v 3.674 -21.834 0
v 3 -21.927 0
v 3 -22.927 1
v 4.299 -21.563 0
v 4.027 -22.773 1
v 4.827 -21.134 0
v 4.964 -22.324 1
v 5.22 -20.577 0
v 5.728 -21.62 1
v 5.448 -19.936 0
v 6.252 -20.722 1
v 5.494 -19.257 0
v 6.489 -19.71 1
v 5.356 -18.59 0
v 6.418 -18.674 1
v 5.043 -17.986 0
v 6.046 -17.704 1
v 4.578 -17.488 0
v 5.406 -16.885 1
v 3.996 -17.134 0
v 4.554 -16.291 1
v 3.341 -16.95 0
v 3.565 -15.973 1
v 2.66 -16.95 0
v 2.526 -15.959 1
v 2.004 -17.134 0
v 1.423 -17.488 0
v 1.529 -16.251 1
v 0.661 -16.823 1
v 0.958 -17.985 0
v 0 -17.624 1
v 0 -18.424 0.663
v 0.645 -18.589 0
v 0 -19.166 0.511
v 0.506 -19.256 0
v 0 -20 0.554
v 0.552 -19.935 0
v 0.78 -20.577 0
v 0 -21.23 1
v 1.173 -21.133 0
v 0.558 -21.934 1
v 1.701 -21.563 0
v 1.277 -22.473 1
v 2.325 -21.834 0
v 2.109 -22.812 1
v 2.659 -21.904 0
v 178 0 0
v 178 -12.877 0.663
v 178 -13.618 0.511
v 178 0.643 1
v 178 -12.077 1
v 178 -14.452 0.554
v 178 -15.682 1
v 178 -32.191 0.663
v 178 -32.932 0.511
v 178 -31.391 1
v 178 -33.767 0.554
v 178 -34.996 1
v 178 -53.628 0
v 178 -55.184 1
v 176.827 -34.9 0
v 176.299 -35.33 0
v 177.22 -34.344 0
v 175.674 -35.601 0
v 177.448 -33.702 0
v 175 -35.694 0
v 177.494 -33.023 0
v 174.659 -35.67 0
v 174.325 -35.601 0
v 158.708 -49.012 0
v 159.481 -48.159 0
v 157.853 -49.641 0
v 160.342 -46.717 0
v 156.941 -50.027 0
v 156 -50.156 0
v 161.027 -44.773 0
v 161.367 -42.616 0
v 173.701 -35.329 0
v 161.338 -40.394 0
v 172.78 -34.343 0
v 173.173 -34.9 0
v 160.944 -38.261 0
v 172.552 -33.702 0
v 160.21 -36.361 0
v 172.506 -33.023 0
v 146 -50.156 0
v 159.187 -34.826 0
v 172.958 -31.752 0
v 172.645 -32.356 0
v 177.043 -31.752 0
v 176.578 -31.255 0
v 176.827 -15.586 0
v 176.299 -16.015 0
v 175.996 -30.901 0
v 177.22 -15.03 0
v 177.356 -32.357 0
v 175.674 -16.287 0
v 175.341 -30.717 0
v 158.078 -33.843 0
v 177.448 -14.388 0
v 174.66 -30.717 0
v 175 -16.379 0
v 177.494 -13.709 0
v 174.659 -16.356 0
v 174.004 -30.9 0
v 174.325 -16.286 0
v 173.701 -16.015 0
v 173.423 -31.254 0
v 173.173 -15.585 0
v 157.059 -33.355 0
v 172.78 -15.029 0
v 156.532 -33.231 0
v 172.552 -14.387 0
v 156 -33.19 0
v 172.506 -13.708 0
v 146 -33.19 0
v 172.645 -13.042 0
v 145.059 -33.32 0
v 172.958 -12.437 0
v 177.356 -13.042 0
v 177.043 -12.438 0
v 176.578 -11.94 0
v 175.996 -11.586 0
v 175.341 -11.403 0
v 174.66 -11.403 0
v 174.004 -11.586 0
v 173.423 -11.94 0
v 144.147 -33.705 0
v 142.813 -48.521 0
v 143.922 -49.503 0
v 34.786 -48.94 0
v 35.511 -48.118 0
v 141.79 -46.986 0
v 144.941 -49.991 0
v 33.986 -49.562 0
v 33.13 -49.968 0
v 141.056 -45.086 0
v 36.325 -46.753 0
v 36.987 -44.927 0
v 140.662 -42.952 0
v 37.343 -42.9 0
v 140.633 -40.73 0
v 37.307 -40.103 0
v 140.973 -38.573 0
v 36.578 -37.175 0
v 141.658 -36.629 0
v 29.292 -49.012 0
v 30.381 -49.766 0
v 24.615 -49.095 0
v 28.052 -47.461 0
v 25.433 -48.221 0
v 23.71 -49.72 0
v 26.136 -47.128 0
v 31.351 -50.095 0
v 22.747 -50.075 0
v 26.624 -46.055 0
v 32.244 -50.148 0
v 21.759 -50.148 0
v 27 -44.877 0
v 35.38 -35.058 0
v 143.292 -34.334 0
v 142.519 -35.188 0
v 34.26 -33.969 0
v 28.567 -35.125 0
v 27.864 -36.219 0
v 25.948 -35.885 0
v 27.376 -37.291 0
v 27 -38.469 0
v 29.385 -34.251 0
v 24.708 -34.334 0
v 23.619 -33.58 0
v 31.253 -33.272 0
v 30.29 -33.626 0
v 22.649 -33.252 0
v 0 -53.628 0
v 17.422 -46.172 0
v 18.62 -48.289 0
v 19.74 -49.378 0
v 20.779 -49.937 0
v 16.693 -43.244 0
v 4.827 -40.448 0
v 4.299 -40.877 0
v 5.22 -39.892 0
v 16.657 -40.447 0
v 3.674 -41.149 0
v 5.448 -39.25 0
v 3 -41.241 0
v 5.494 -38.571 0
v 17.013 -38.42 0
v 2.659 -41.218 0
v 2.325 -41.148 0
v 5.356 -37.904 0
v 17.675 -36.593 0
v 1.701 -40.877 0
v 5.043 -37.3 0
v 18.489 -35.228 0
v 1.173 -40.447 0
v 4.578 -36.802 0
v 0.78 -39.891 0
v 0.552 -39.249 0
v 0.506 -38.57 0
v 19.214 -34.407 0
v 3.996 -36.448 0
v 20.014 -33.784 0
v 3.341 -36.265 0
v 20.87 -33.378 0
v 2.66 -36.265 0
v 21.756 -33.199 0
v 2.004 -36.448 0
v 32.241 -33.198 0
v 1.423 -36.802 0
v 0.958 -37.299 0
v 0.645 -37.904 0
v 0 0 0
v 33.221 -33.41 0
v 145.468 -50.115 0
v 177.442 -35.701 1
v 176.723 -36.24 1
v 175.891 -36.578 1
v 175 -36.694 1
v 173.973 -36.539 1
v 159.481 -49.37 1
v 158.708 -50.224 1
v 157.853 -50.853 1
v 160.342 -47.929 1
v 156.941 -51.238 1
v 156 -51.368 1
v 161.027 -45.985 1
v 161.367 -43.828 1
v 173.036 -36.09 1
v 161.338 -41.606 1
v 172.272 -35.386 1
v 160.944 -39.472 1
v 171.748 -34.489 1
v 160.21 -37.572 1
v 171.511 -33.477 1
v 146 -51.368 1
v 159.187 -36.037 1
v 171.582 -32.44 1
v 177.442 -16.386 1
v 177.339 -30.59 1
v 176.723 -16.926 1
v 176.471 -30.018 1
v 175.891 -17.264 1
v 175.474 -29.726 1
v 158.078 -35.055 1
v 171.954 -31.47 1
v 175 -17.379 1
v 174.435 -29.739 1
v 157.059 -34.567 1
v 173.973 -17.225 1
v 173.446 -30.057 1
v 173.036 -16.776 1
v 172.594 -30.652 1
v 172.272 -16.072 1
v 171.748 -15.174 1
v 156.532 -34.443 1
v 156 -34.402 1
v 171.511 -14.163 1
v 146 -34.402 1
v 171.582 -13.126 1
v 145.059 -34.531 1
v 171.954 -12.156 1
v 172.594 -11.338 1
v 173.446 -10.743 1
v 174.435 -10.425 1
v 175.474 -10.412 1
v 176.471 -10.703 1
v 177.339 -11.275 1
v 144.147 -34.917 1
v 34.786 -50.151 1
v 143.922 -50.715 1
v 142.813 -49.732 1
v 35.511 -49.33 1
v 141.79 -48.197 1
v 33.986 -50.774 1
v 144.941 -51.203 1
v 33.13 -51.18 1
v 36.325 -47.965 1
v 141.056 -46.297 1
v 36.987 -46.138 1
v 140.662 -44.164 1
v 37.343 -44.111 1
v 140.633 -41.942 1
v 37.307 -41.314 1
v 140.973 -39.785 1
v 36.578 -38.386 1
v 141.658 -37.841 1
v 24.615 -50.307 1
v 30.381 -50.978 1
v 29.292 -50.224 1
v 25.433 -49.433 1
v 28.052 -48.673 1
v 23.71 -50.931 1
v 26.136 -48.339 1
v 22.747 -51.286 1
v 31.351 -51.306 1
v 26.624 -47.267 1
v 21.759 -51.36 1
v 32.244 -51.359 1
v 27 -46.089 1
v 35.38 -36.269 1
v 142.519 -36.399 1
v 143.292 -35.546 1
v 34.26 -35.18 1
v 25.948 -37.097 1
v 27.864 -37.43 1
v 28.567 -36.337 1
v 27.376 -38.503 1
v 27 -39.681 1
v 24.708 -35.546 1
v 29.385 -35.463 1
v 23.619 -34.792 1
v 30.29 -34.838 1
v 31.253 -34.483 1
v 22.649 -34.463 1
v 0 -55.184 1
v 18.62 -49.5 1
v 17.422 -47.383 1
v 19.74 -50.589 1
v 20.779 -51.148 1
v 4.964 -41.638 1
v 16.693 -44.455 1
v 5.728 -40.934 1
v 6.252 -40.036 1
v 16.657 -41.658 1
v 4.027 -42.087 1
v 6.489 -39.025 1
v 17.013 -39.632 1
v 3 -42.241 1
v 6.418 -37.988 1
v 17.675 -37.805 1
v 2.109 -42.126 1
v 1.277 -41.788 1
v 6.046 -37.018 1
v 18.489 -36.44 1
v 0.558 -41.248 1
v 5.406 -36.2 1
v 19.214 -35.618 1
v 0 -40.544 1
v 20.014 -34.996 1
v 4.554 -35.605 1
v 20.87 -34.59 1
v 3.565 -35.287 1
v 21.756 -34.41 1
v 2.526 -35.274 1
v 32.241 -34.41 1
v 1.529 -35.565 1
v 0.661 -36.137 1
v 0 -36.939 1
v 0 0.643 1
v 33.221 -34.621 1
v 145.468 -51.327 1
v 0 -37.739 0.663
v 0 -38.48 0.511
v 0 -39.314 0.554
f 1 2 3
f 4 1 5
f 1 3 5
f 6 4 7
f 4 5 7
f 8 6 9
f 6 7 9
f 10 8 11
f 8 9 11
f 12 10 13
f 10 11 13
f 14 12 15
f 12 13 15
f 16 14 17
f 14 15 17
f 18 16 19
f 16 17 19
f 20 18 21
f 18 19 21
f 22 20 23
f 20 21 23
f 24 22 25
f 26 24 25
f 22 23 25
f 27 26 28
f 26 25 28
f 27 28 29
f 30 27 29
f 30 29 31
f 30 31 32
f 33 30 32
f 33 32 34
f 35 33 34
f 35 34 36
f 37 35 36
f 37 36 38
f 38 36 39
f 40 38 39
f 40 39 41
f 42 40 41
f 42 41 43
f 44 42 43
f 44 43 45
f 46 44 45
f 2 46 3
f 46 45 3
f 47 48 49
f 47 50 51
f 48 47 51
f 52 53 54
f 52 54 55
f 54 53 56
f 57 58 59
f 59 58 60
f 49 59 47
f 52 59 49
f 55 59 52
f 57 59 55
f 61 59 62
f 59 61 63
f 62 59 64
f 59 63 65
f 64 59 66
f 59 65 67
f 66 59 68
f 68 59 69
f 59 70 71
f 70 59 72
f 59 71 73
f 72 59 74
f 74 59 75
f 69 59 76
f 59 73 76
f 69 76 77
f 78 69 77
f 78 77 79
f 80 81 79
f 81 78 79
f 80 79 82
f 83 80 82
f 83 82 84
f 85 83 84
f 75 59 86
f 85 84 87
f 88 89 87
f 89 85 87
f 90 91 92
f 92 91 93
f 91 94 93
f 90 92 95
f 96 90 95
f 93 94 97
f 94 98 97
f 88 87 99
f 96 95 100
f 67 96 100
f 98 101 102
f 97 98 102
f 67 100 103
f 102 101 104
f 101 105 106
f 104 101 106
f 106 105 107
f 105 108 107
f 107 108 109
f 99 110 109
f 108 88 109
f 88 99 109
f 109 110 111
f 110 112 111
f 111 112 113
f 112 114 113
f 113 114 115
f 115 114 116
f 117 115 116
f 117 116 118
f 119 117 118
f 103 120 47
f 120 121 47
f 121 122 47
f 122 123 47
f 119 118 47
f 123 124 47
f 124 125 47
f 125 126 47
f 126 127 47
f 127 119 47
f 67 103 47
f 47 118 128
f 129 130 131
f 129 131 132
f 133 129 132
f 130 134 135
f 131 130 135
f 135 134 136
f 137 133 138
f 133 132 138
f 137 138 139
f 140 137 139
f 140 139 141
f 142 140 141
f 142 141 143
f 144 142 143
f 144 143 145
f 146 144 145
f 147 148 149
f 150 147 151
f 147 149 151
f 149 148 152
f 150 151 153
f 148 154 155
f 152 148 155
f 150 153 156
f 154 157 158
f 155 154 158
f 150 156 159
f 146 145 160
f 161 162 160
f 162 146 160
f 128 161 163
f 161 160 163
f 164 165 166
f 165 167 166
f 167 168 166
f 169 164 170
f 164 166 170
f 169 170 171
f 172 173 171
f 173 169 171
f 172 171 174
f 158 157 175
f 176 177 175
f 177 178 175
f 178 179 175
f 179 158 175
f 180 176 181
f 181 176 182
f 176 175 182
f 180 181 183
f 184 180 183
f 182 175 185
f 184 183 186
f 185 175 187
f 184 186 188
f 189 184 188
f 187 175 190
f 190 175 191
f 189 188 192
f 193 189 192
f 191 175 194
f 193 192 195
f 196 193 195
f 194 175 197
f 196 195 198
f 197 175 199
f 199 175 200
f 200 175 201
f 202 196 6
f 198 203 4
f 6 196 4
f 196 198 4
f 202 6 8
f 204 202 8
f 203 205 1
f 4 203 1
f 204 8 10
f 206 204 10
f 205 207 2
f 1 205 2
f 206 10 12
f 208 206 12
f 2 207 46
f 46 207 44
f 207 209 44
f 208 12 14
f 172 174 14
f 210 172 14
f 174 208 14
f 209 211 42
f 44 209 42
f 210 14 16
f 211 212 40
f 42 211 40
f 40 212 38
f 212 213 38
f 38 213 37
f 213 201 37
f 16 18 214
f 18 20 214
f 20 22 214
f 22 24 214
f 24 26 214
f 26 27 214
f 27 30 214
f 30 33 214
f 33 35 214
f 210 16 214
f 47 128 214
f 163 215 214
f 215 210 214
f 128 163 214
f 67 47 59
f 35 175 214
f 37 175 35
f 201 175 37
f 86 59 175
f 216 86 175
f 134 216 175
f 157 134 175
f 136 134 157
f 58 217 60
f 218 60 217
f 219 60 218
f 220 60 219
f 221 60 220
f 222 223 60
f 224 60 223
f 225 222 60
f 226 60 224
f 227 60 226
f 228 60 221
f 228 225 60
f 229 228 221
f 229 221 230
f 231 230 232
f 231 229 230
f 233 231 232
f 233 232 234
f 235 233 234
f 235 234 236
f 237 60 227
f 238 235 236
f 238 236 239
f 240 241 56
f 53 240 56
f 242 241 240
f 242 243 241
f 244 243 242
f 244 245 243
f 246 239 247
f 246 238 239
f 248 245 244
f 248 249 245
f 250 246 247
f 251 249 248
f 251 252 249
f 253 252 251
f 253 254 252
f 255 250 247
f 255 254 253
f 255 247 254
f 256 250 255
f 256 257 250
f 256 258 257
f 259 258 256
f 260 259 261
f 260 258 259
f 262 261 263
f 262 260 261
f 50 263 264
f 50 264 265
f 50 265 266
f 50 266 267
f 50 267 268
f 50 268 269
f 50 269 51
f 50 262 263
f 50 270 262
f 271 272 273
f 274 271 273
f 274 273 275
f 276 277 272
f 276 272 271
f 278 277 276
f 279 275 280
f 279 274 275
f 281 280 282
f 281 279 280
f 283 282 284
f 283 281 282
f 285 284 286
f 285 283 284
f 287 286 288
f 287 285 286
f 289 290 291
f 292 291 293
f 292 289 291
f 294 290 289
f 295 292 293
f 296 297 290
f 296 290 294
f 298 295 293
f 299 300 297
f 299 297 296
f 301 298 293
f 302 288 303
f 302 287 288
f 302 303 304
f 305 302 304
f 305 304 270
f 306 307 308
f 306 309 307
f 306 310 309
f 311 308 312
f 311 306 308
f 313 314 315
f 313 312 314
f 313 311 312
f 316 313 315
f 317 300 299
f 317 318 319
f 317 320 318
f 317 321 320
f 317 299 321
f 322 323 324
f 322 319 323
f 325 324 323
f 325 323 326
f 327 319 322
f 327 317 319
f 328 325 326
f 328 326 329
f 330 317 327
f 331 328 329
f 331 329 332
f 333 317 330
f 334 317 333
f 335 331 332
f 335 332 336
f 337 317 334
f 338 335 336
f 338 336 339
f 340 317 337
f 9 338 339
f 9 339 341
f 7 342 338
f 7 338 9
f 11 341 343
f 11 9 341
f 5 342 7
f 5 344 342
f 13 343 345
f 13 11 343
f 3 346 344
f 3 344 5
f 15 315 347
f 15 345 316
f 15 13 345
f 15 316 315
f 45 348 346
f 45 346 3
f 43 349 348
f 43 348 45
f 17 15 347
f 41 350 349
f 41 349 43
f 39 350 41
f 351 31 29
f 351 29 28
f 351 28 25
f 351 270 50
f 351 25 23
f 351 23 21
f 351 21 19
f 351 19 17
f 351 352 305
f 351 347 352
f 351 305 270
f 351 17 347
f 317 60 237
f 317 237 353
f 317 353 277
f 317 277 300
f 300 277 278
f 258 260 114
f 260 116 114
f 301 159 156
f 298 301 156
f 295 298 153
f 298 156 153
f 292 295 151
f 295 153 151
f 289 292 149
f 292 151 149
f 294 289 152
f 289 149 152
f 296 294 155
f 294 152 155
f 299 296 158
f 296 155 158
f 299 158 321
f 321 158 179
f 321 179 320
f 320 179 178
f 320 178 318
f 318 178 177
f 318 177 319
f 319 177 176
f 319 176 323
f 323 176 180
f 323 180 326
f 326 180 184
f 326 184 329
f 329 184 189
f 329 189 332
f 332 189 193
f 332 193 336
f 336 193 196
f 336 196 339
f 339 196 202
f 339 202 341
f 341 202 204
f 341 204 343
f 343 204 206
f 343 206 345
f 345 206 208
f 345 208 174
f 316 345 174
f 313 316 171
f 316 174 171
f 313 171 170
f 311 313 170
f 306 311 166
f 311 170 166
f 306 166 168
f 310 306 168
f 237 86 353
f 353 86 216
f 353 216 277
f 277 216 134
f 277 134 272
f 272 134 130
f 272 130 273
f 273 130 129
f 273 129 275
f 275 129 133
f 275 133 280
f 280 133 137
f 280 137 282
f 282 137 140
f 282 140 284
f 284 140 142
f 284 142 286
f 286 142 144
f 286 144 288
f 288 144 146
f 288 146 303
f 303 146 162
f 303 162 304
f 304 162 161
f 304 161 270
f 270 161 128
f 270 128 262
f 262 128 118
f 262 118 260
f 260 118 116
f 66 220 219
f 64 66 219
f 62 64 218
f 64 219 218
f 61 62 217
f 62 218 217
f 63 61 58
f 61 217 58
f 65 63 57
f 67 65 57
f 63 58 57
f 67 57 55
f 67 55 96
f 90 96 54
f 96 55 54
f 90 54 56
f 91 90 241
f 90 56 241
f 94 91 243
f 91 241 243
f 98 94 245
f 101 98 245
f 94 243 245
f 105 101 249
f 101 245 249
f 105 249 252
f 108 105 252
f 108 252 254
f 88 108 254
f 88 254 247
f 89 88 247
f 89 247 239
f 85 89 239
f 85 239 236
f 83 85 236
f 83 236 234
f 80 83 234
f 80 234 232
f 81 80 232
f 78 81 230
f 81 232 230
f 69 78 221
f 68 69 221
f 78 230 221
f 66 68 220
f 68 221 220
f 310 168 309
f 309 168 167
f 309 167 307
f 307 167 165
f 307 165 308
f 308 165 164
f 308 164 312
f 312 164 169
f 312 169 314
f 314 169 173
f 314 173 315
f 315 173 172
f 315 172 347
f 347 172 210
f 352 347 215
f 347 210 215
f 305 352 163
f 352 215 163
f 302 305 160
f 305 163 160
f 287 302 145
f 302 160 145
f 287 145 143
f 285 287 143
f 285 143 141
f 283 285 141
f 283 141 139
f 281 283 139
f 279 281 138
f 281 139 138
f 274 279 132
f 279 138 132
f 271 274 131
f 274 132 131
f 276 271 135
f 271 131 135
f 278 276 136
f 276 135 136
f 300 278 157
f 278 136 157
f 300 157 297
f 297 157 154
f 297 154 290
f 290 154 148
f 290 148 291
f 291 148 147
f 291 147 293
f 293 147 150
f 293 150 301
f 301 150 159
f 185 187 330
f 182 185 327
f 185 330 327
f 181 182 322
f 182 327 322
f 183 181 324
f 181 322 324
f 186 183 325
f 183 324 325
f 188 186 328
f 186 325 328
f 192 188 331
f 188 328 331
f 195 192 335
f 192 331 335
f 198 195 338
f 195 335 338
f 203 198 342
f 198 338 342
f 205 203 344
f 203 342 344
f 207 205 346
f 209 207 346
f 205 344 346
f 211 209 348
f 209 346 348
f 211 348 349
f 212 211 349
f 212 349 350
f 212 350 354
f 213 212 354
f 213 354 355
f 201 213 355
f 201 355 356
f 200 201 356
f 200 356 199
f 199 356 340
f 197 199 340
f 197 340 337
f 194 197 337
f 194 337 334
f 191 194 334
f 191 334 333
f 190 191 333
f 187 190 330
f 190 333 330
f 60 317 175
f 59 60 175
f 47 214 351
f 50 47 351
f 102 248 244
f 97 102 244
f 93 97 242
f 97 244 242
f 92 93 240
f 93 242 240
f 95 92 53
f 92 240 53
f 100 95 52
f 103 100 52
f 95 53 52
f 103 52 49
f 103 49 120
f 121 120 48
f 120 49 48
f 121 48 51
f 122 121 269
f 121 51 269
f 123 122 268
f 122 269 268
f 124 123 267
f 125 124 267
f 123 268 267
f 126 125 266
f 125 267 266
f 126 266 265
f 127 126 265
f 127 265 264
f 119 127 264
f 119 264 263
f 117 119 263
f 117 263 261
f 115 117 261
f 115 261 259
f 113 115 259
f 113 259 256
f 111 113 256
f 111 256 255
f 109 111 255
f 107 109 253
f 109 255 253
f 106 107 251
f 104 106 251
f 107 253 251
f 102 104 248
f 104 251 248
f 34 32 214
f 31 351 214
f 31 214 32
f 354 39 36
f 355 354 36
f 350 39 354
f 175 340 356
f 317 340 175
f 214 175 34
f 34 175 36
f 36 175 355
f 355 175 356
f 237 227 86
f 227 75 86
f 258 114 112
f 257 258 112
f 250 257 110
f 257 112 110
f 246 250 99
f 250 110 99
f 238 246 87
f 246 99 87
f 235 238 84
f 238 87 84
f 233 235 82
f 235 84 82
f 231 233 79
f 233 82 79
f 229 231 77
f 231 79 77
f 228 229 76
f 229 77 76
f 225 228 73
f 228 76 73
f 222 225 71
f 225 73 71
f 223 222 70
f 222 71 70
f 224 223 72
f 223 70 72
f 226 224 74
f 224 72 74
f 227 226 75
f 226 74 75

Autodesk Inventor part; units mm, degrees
ref_plane "Work Plane1" through (0, 4.7283, -22.9522) normal (-1, 0, 0) x (0, -0.8411785, 0.5407576)
sketch "Sketch1" plane through (0, 4.7283, -22.9522) normal (-1, 0, 0) x (0, -0.8411785, 0.5407576)
  line L0 (61.5, -12.25) -> (61.5, -16.75) projected
  line L1 (61.5, -16.75) -> (65.5, -16.75) projected
  line L2 (65.5, -16.75) -> (65.5, -20.25) projected
  line L3 (65.5, -20.25) -> (79.5, -20.25) projected
  line L4 (79.5, -20.25) -> (65.5, -11.25) projected
  line L5 (65.5, -11.25) -> (65.5, -12.25) projected
  line L6 (65.5, -12.25) -> (61.5, -12.25) projected
  line L7 (16.3889, 16.75) -> (16.3889, 18.75) projected
  line L8 (14.7421, 12.75) -> (16.3889, 18.75)
  line L9 (63.3493, -12.25) -> (12.0798, 20.7089)
  line L10 (16.3889, 16.75) -> (16.3889, 17.9388)
  arc A0 (-57.551, -16.75) -> (-61.5, -12.801) centre (-58.75, -14) ccw projected
  arc A1 (-34.301, -16.75) -> (-36.699, -16.75) centre (-35.5, -14) ccw projected
  line L11 (61.5, -12.25) -> (16.3889, 16.75) projected
  line L12 (16.3889, 13.75) -> (-61.5, 13.75) projected
  line L13 (-61.5, 13.75) -> (-61.5, -12.801) projected
  line L14 (-61.5, 13.75) -> (-61.5, -12.801) projected
  arc A2 (-57.551, -16.75) -> (-61.5, -12.801) centre (-58.75, -14) ccw projected
  line L15 (-57.551, -16.75) -> (-36.699, -16.75) projected
  arc A3 (-34.301, -16.75) -> (-36.699, -16.75) centre (-35.5, -14) ccw projected
  line L16 (-34.301, -16.75) -> (61.5, -16.75) projected
  line L17 (61.5, -16.75) -> (61.5, -12.25) projected
  line L18 (21.0556, 13.75) -> (-61.5, 13.75) projected
  line L19 (-57.551, -16.75) -> (-36.699, -16.75) projected
  line L20 (-34.301, -16.75) -> (61.5, -16.75) projected
  line L21 (61.5, -16.75) -> (61.5, -12.25) projected
  line L22 (61.5, -12.25) -> (21.0556, 13.75) projected
  point P0 (16.3889, 17.9388)
  point P1 (15.5655, 15.75)
  point P2 (16.3889, 17.9388)
  point P3 (16.1996, 18.0605)
  dimension "d14" = 1
  dimension "d15" = 2
ref_plane "Work Plane2" through (178, -56.0619, -70.2985) normal (1, 0, 0) x (0, 0.8411785, -0.5407576)
extrude "Extrusion1" add sketch "Sketch1" against normal up to surface (178 mm away) contours L11 L7 L9 L6
sketch "Sketch2" plane through (0, -55.184, 1) normal (0, 0, 1) x (1, 0, 0)
  circle A0 centre (3, 16.4427) radius 2.5 projected
  circle A1 centre (3, 35.7569) radius 2.5 projected
  line L0 (0, 2.3333) -> (0, 55.184) projected
  line L1 (0, 2.3333) -> (3, 2.3333) projected
  line L2 (6, 50.414) -> (6, 9.4662) projected
  line L3 (0, 50.414) -> (6, 50.414) projected
  circle A2 centre (175, 21.9904) radius 2.5 projected
  circle A3 centre (175, 41.3047) radius 2.5 projected
  line L4 (178, 2.3333) -> (178, 55.9618) projected
  line L5 (178, 55.9618) -> (172, 55.9618) projected
  line L6 (172, 55.9618) -> (172, 2.3333) projected
  line L7 (178, 2.3333) -> (172, 2.3333) projected
  line L8 (3, 9.4662) -> (3, 2.3333) projected
  line L9 (3, 9.4662) -> (6, 9.4662) projected
  point P0 (3, 35.7569)
  point P1 (3, 16.4427)
hole "Hole1" at (3, -19.4271, 1) at (3, -38.7413, 1) at (175, -33.1936, 1) at (175, -13.8793, 1) direction (0, 0, -1) diameter 3.6 end through all countersink diameter 7 countersink angle 90 clearance for "Countersunk Flat Head Screw ISO 2009/7046" size "M3" standard "ISO"
ref_plane "Work Plane3" through (22, -31.0502, -8.6656) normal (0, -0.7712334, 0.6365525) x (1, 0, 0)
sketch "Sketch3" plane through (22, -31.0502, -8.6656) normal (0, -0.7712334, 0.6365525) x (1, 0, 0)
  line L0 (-9.9215, 5.3729) -> (-9.9215, -5.5323)
  spline S0 degree 3 poles (-9.9215, -5.5323) (-9.9222, -5.6561) (-9.8204, -5.8999) (-9.5772, -6.0011) (-9.4534, -6.0004) knots 0 0 0 0 0.5 1 1 1 1
  line L1 (-9.4534, -6.0004) -> (19.4534, -6.0004)
  spline S1 degree 3 poles (19.4534, -6.0004) (19.5775, -6.0011) (19.8219, -5.8989) (19.9222, -5.6548) (19.9215, -5.5307) knots 0 0 0 0 0.5 1 1 1 1
  line L2 (19.9215, -5.5307) -> (19.9215, 5.3744)
  spline S2 degree 3 poles (19.9215, 5.3744) (19.9222, 5.4985) (19.82, 5.743) (19.5758, 5.8433) (19.4518, 5.8426) knots 0 0 0 0 0.5 1 1 1 1
  line L3 (19.4518, 5.8426) -> (-9.4534, 5.8426)
  spline S3 degree 3 poles (-9.4534, 5.8426) (-9.5775, 5.8433) (-9.8219, 5.7411) (-9.9222, 5.4969) (-9.9215, 5.3729) knots 0 0 0 0 0.5 1 1 1 1
  circle A0 centre (-8.3791, -4.458) radius 0.5
  circle A1 centre (-8.3791, 4.3001) radius 0.5
  circle A2 centre (18.3791, 4.3001) radius 0.5
  circle A3 centre (18.3791, -4.458) radius 0.5
  arc A4 (5.2617, -1.5301) -> (5.1811, -1.6008) centre (5.2771, -1.6289) ccw
  arc A5 (5.1811, 1.4429) -> (5.1811, -1.6008) centre (0, -0.0789) ccw
  arc A6 (5.1811, 1.4429) -> (5.2617, 1.3723) centre (5.2771, 1.4711) ccw
  arc A7 (5.2617, 1.3723) -> (5.3414, 1.4401) centre (5.2463, 1.4711) ccw
  arc A8 (5.3414, -1.5979) -> (5.3414, 1.4401) centre (10, -0.0789) ccw
  arc A9 (5.3414, -1.5979) -> (5.2617, -1.5301) centre (5.2463, -1.6289) ccw
  line L4 (143.9215, 5.3729) -> (143.9215, -5.5323)
  spline S4 degree 3 poles (143.4534, 5.8426) (143.5775, 5.8433) (143.8219, 5.7411) (143.9222, 5.4969) (143.9215, 5.3729) knots 0 0 0 0 0.5 1 1 1 1
  line L5 (114.5482, 5.8426) -> (143.4534, 5.8426)
  spline S5 degree 3 poles (114.0785, 5.3744) (114.0778, 5.4985) (114.18, 5.743) (114.4242, 5.8433) (114.5482, 5.8426) knots 0 0 0 0 0.5 1 1 1 1
  line L6 (114.0785, -5.5307) -> (114.0785, 5.3744)
  spline S6 degree 3 poles (114.5466, -6.0004) (114.4225, -6.0011) (114.1781, -5.8989) (114.0778, -5.6548) (114.0785, -5.5307) knots 0 0 0 0 0.5 1 1 1 1
  line L7 (143.4534, -6.0004) -> (114.5466, -6.0004)
  spline S7 degree 3 poles (143.9215, -5.5323) (143.9222, -5.6561) (143.8204, -5.8999) (143.5772, -6.0011) (143.4534, -6.0004) knots 0 0 0 0 0.5 1 1 1 1
  circle A10 centre (142.3791, -4.458) radius 0.5
  circle A11 centre (142.3791, 4.3001) radius 0.5
  circle A12 centre (115.6209, 4.3001) radius 0.5
  circle A13 centre (115.6209, -4.458) radius 0.5
  arc A14 (128.8189, -1.6008) -> (128.7383, -1.5301) centre (128.7229, -1.6289) ccw
  arc A15 (128.7383, -1.5301) -> (128.6586, -1.5979) centre (128.7537, -1.6289) ccw
  arc A16 (128.6586, 1.4401) -> (128.6586, -1.5979) centre (124, -0.0789) ccw
  arc A17 (128.6586, 1.4401) -> (128.7383, 1.3723) centre (128.7537, 1.4711) ccw
  arc A18 (128.7383, 1.3723) -> (128.8189, 1.4429) centre (128.7229, 1.4711) ccw
  arc A19 (128.8189, -1.6008) -> (128.8189, 1.4429) centre (134, -0.0789) ccw
  circle A20 centre (10, -0.0789) radius 5.4
  circle A21 centre (124, -0.0789) radius 5.4
  line L8 (0, 5.3211) -> (10, 5.3211)
  line L9 (10, -5.4789) -> (0, -5.4789)
  line L10 (124, 5.3211) -> (134, 5.3211)
  line L11 (134, -5.4789) -> (124, -5.4789)
  point P0 (-22, 26.4483)
  point P1 (14.6373, -1.6617)
  point P2 (5, 1.9607)
  point P3 (5.3627, -1.6617)
  point P4 (5, -2.1185)
  point P5 (7.5029, -4.2949)
  point P6 (3.3743, -4.2949)
  point P7 (5.2923, -1.5401)
  dimension "d9" = 10.8
  dimension "d10" = 10.8
extrude "Extrusion2" cut sketch "Sketch3" along normal blind 78.25 contours A9 A8 A7 A6 A5 A20 A4 | A4 A5 A20 A6 A7 A8 A9 | A5 A20 | A19 A21 A18 A17 A16 A15 A14 | A14 A15 A16 A17 A18 A19 A21 | A21 A19 | A19 L11 A21 | A19 A21 L10
properties part number "front" material "Aluminum 6061"
